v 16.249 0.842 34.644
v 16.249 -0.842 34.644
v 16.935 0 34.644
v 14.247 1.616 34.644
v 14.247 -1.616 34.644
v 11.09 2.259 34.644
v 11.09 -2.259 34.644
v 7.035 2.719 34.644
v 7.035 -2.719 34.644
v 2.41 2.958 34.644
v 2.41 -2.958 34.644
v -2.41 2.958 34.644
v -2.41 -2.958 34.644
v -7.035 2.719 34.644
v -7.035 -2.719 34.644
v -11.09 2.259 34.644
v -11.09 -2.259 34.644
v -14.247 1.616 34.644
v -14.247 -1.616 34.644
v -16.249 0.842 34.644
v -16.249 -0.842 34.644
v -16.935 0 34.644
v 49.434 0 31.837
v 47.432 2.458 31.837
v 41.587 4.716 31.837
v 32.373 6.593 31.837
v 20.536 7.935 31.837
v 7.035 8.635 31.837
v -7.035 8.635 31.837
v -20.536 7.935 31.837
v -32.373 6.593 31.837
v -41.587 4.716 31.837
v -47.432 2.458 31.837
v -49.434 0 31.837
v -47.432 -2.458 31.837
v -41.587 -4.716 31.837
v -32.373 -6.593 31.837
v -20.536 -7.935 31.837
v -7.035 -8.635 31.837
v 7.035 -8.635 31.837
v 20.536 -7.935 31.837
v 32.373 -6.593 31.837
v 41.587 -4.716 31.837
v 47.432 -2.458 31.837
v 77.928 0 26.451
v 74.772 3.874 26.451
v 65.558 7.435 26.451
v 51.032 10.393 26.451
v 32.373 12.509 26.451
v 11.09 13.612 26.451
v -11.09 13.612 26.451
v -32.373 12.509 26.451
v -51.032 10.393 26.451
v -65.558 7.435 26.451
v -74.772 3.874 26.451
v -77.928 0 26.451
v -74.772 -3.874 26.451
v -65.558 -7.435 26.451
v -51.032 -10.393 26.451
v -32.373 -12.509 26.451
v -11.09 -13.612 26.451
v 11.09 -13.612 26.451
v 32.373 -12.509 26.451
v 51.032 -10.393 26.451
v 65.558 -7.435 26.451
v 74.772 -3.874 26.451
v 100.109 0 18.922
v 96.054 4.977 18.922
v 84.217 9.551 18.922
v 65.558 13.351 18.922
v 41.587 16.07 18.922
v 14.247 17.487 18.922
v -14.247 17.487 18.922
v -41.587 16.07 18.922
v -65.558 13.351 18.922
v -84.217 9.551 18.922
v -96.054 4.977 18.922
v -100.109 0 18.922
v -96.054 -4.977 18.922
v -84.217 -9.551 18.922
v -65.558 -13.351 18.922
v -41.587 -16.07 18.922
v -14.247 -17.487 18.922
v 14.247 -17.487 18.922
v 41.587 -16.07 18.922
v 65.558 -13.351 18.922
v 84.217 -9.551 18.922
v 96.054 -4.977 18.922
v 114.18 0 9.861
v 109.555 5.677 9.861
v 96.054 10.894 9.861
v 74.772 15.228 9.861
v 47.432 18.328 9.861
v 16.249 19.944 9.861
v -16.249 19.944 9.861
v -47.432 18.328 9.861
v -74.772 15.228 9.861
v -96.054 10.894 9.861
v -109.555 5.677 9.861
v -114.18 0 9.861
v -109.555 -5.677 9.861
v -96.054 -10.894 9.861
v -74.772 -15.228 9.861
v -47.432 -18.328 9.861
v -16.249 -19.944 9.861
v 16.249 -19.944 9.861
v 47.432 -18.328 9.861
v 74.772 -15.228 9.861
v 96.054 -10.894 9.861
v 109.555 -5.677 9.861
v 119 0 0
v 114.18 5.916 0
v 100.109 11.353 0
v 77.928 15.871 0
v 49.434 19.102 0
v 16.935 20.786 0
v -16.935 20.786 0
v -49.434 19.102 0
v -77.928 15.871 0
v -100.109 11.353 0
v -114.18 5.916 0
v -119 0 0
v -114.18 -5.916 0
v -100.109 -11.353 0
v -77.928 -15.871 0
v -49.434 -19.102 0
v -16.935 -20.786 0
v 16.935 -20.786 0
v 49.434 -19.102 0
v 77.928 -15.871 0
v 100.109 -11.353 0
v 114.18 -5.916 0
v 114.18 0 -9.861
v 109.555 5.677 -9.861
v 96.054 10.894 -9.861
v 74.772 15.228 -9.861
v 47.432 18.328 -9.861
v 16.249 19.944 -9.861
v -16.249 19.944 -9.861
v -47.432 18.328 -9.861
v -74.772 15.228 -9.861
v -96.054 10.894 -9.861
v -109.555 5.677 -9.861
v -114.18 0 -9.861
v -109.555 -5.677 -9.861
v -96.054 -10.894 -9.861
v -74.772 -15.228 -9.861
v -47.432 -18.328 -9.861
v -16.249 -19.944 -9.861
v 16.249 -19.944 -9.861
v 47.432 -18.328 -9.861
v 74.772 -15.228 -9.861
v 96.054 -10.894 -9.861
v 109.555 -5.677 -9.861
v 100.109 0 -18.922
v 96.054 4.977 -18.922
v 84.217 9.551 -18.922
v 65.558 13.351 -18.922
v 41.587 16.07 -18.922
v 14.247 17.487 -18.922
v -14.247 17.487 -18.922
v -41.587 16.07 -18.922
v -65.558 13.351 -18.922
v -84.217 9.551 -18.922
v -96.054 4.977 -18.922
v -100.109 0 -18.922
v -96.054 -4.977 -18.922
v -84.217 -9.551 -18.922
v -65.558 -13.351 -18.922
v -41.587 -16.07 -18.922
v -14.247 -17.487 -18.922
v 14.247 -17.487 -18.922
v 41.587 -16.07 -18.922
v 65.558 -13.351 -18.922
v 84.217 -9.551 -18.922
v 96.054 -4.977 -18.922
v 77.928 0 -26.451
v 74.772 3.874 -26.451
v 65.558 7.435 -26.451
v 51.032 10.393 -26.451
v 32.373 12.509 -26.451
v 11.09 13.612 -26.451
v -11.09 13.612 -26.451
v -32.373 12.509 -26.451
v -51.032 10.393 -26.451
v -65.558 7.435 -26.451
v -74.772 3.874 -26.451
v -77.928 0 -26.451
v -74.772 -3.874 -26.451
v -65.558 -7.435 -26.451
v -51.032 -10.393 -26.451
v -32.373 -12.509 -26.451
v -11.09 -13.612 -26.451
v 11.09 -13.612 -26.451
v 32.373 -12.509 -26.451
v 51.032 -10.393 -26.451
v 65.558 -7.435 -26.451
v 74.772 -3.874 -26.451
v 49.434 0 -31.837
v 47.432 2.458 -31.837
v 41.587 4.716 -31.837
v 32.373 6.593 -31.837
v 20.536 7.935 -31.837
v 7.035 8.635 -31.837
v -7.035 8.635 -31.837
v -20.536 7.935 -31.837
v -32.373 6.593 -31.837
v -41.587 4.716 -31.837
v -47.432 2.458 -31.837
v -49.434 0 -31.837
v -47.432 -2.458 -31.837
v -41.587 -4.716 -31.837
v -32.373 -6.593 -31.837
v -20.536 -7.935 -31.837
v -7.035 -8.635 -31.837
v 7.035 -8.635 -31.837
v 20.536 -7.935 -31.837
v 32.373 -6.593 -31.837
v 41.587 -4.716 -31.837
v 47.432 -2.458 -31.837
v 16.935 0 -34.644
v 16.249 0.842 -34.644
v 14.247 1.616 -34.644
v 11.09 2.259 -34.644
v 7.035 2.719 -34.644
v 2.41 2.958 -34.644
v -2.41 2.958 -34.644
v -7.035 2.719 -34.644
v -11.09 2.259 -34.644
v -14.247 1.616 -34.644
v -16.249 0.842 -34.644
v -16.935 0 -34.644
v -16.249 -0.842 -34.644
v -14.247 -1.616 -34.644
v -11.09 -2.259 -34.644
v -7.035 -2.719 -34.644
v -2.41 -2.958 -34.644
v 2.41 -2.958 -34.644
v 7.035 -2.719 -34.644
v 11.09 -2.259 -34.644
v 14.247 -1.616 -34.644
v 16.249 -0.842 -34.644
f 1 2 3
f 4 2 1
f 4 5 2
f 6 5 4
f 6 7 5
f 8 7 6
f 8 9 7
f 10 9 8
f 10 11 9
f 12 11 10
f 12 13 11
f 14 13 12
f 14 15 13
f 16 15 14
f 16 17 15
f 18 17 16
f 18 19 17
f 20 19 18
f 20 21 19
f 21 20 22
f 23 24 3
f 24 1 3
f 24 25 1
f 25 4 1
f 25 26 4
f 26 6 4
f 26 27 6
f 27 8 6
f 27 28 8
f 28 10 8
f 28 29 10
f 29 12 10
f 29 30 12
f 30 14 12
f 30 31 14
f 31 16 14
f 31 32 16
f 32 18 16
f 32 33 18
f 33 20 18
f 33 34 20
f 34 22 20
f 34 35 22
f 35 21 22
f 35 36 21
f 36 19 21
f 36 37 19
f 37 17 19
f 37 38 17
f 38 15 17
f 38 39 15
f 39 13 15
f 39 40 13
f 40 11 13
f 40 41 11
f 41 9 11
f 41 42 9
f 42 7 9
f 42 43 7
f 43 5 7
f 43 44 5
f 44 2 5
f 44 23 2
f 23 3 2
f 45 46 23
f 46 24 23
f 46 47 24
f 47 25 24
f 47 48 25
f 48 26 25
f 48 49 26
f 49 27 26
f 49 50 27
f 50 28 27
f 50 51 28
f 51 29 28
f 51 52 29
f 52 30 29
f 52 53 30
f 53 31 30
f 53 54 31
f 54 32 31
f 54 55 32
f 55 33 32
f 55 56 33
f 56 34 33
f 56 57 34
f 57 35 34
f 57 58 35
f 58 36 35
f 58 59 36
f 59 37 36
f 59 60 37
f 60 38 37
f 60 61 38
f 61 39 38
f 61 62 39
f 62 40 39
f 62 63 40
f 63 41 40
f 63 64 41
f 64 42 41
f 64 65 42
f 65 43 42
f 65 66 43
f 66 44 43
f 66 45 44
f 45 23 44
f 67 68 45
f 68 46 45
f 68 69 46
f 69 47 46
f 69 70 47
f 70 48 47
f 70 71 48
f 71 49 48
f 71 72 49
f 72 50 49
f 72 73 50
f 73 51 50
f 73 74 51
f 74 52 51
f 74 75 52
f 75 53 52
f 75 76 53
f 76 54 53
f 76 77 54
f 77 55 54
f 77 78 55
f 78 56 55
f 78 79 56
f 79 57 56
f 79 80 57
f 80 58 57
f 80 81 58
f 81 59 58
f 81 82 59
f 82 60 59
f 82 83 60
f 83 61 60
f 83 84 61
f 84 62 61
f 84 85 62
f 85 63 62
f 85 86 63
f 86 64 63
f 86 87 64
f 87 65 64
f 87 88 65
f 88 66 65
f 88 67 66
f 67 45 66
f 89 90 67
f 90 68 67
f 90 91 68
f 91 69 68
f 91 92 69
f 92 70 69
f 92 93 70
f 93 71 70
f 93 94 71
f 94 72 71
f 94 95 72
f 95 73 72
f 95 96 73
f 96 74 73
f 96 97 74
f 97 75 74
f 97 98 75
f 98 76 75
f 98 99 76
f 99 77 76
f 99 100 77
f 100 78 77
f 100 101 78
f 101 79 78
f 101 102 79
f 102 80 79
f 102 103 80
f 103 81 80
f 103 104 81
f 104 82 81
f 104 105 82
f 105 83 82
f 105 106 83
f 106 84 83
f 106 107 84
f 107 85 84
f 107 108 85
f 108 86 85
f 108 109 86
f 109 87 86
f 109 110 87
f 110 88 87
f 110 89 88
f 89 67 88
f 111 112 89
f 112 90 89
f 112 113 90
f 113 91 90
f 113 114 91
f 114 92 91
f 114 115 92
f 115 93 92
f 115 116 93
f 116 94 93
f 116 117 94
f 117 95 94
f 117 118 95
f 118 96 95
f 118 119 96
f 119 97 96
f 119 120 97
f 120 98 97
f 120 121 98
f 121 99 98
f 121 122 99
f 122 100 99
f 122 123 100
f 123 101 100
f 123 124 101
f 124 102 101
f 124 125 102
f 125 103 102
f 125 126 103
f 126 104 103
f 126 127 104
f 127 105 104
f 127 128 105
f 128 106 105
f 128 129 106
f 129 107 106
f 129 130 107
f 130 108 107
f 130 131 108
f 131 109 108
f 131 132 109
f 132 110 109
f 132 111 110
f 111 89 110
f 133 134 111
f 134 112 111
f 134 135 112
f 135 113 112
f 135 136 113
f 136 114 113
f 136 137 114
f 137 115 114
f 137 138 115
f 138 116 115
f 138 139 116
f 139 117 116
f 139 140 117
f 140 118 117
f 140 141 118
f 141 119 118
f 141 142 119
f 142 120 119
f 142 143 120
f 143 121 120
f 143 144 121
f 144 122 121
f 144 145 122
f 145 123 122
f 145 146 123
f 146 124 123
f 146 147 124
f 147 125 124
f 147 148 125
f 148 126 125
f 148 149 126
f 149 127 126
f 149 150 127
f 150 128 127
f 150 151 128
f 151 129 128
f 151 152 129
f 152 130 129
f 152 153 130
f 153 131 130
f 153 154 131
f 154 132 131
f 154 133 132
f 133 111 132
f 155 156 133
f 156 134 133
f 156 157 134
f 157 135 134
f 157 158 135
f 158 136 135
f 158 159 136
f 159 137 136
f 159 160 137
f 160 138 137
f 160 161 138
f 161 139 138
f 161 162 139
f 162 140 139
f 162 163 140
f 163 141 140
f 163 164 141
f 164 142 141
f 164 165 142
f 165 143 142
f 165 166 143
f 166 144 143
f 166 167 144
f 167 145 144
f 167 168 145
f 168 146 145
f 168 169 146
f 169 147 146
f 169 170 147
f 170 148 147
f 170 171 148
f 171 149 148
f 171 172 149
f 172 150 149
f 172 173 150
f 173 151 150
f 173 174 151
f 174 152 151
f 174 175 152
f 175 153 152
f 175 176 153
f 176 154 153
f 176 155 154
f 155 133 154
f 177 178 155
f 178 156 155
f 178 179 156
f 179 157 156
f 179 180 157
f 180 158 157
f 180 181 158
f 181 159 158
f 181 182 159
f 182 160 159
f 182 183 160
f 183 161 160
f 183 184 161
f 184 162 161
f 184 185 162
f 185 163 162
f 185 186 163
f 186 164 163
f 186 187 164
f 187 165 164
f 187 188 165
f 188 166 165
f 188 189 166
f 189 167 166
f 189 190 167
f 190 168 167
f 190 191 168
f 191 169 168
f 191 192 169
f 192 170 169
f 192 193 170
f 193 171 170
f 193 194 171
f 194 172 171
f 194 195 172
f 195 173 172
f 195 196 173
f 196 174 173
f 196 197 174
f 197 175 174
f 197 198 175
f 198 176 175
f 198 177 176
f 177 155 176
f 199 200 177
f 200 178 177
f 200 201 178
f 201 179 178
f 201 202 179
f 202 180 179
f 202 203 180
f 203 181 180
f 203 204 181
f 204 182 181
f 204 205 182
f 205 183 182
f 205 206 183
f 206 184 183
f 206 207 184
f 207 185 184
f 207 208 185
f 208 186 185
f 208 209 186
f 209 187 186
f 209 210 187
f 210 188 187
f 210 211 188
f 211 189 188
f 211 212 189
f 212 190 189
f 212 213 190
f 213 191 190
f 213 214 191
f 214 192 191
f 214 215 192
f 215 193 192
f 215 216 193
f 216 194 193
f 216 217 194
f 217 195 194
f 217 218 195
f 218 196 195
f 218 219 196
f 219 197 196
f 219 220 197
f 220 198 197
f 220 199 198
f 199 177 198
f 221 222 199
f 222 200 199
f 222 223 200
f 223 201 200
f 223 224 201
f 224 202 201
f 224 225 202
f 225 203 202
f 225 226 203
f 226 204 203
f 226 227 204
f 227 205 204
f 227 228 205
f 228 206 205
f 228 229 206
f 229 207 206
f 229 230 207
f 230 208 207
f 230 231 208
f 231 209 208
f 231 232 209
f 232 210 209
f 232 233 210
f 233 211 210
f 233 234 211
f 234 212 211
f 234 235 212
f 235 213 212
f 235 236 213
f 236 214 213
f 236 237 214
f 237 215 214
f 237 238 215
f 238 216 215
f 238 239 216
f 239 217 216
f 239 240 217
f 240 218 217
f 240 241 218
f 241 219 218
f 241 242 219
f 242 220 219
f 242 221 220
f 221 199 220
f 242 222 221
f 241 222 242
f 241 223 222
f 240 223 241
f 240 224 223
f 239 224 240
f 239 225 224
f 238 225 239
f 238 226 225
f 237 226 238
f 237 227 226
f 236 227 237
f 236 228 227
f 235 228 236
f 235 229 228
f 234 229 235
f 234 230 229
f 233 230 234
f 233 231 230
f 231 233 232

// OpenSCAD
// Generated by SolidPython 1.0.1 on 2020-07-29 00:46:52


scale(v = [17, 3, 5]) {
	sphere(r = 7);
}
/***********************************************
*********      SolidPython code:      **********
************************************************
 
# import packages: SolidPython
from solid import *
from solid.utils import *
from itertools import chain, combinations, permutations


class Resize:

    def __init__(self, scad_file):
        self.scad_file = scad_file
        #self.scad_file = import_scad(scad_file)
        # cone/cylinder param:
        self.r1 = 0
        self.r2 = 0
        self.h = 0
        # rectangular prism param:
        self.w = 0
        self.l = 0
        # ellipse param:
        self.r = 0

    # import OpenScad code (file name corresponds to shape)


    # classify shape + parameters
    def assign(self, param1, param2, param3):
        if self.scad_file == 'cone.scad':
            self.r1 = param1
            self.r2 = param2
            self.h = param3
        elif self.scad_file == 'cylinder.scad':
            self.r1 = param1
            self.r2 = param2
            self.h = param3
        elif self.scad_file == 'rectangularPrism.scad':
            self.h = param1
            self.l = param2
            self.w = param3
        else:
            self.r = param1
            self.h = param2

    # resize parameters
    def iterate(self):
        x = range(3, 20, 2)
        i = 1
        if self.scad_file == 'cone.scad':
            tempList = list(permutations(x, 2))
            for temp in tempList:
                param1 = temp[0]
                param2 = temp[1]
                filepath = 'produced_scad_files/' + 'cone' + str(param1) + '_' + str(param2) + '_' + '.scad'
                scad_render_to_file(cylinder(h=param1, r1=param2, r2=0), filepath)

        elif self.scad_file == 'cylinder.scad':
            tempList = list(permutations(x, 3))
            for temp in tempList:
                param1 = temp[0]
                param2 = temp[1]
                filepath = 'produced_scad_files/' + 'cylinder' + str(param1) + '_' + str(param2) + '_' + '.scad'
                scad_render_to_file(cylinder(h=param1, r1=param2, r2=param2), filepath)

        elif self.scad_file == 'rectangularPrism.scad':
            tempList = list(permutations(x, 3))
            for temp in tempList:
                param1 = temp[0]
                param2 = temp[1]
                param3 = temp[2]
                filepath = 'produced_scad_files/' + 'rectangularPrism' + str(param1) + '_' + str(param2) + '_' + str(
                    param3) + '.scad'
                scad_render_to_file(cube(size=(param1, param2, param3)), filepath)

        elif self.scad_file == 'ellipse.scad':
            tempList = list(permutations(x, 4))
            for temp in tempList:
                param1 = temp[0]
                param2 = temp[1]
                param3 = temp[2]
                param4 = temp[3]
                filepath = 'produced_scad_files/' + 'ellipse' + str(param1) + '_' + str(param2) + '_' + str(param3) + '_' + str(param4) + '.scad'
                scad_render_to_file(scale([param1, param2, param3])(sphere(r=param4)), filepath)

    def render_to_scadfile(self):
        scad_render_to_file(scad, 'example.scad') 
 
************************************************/
